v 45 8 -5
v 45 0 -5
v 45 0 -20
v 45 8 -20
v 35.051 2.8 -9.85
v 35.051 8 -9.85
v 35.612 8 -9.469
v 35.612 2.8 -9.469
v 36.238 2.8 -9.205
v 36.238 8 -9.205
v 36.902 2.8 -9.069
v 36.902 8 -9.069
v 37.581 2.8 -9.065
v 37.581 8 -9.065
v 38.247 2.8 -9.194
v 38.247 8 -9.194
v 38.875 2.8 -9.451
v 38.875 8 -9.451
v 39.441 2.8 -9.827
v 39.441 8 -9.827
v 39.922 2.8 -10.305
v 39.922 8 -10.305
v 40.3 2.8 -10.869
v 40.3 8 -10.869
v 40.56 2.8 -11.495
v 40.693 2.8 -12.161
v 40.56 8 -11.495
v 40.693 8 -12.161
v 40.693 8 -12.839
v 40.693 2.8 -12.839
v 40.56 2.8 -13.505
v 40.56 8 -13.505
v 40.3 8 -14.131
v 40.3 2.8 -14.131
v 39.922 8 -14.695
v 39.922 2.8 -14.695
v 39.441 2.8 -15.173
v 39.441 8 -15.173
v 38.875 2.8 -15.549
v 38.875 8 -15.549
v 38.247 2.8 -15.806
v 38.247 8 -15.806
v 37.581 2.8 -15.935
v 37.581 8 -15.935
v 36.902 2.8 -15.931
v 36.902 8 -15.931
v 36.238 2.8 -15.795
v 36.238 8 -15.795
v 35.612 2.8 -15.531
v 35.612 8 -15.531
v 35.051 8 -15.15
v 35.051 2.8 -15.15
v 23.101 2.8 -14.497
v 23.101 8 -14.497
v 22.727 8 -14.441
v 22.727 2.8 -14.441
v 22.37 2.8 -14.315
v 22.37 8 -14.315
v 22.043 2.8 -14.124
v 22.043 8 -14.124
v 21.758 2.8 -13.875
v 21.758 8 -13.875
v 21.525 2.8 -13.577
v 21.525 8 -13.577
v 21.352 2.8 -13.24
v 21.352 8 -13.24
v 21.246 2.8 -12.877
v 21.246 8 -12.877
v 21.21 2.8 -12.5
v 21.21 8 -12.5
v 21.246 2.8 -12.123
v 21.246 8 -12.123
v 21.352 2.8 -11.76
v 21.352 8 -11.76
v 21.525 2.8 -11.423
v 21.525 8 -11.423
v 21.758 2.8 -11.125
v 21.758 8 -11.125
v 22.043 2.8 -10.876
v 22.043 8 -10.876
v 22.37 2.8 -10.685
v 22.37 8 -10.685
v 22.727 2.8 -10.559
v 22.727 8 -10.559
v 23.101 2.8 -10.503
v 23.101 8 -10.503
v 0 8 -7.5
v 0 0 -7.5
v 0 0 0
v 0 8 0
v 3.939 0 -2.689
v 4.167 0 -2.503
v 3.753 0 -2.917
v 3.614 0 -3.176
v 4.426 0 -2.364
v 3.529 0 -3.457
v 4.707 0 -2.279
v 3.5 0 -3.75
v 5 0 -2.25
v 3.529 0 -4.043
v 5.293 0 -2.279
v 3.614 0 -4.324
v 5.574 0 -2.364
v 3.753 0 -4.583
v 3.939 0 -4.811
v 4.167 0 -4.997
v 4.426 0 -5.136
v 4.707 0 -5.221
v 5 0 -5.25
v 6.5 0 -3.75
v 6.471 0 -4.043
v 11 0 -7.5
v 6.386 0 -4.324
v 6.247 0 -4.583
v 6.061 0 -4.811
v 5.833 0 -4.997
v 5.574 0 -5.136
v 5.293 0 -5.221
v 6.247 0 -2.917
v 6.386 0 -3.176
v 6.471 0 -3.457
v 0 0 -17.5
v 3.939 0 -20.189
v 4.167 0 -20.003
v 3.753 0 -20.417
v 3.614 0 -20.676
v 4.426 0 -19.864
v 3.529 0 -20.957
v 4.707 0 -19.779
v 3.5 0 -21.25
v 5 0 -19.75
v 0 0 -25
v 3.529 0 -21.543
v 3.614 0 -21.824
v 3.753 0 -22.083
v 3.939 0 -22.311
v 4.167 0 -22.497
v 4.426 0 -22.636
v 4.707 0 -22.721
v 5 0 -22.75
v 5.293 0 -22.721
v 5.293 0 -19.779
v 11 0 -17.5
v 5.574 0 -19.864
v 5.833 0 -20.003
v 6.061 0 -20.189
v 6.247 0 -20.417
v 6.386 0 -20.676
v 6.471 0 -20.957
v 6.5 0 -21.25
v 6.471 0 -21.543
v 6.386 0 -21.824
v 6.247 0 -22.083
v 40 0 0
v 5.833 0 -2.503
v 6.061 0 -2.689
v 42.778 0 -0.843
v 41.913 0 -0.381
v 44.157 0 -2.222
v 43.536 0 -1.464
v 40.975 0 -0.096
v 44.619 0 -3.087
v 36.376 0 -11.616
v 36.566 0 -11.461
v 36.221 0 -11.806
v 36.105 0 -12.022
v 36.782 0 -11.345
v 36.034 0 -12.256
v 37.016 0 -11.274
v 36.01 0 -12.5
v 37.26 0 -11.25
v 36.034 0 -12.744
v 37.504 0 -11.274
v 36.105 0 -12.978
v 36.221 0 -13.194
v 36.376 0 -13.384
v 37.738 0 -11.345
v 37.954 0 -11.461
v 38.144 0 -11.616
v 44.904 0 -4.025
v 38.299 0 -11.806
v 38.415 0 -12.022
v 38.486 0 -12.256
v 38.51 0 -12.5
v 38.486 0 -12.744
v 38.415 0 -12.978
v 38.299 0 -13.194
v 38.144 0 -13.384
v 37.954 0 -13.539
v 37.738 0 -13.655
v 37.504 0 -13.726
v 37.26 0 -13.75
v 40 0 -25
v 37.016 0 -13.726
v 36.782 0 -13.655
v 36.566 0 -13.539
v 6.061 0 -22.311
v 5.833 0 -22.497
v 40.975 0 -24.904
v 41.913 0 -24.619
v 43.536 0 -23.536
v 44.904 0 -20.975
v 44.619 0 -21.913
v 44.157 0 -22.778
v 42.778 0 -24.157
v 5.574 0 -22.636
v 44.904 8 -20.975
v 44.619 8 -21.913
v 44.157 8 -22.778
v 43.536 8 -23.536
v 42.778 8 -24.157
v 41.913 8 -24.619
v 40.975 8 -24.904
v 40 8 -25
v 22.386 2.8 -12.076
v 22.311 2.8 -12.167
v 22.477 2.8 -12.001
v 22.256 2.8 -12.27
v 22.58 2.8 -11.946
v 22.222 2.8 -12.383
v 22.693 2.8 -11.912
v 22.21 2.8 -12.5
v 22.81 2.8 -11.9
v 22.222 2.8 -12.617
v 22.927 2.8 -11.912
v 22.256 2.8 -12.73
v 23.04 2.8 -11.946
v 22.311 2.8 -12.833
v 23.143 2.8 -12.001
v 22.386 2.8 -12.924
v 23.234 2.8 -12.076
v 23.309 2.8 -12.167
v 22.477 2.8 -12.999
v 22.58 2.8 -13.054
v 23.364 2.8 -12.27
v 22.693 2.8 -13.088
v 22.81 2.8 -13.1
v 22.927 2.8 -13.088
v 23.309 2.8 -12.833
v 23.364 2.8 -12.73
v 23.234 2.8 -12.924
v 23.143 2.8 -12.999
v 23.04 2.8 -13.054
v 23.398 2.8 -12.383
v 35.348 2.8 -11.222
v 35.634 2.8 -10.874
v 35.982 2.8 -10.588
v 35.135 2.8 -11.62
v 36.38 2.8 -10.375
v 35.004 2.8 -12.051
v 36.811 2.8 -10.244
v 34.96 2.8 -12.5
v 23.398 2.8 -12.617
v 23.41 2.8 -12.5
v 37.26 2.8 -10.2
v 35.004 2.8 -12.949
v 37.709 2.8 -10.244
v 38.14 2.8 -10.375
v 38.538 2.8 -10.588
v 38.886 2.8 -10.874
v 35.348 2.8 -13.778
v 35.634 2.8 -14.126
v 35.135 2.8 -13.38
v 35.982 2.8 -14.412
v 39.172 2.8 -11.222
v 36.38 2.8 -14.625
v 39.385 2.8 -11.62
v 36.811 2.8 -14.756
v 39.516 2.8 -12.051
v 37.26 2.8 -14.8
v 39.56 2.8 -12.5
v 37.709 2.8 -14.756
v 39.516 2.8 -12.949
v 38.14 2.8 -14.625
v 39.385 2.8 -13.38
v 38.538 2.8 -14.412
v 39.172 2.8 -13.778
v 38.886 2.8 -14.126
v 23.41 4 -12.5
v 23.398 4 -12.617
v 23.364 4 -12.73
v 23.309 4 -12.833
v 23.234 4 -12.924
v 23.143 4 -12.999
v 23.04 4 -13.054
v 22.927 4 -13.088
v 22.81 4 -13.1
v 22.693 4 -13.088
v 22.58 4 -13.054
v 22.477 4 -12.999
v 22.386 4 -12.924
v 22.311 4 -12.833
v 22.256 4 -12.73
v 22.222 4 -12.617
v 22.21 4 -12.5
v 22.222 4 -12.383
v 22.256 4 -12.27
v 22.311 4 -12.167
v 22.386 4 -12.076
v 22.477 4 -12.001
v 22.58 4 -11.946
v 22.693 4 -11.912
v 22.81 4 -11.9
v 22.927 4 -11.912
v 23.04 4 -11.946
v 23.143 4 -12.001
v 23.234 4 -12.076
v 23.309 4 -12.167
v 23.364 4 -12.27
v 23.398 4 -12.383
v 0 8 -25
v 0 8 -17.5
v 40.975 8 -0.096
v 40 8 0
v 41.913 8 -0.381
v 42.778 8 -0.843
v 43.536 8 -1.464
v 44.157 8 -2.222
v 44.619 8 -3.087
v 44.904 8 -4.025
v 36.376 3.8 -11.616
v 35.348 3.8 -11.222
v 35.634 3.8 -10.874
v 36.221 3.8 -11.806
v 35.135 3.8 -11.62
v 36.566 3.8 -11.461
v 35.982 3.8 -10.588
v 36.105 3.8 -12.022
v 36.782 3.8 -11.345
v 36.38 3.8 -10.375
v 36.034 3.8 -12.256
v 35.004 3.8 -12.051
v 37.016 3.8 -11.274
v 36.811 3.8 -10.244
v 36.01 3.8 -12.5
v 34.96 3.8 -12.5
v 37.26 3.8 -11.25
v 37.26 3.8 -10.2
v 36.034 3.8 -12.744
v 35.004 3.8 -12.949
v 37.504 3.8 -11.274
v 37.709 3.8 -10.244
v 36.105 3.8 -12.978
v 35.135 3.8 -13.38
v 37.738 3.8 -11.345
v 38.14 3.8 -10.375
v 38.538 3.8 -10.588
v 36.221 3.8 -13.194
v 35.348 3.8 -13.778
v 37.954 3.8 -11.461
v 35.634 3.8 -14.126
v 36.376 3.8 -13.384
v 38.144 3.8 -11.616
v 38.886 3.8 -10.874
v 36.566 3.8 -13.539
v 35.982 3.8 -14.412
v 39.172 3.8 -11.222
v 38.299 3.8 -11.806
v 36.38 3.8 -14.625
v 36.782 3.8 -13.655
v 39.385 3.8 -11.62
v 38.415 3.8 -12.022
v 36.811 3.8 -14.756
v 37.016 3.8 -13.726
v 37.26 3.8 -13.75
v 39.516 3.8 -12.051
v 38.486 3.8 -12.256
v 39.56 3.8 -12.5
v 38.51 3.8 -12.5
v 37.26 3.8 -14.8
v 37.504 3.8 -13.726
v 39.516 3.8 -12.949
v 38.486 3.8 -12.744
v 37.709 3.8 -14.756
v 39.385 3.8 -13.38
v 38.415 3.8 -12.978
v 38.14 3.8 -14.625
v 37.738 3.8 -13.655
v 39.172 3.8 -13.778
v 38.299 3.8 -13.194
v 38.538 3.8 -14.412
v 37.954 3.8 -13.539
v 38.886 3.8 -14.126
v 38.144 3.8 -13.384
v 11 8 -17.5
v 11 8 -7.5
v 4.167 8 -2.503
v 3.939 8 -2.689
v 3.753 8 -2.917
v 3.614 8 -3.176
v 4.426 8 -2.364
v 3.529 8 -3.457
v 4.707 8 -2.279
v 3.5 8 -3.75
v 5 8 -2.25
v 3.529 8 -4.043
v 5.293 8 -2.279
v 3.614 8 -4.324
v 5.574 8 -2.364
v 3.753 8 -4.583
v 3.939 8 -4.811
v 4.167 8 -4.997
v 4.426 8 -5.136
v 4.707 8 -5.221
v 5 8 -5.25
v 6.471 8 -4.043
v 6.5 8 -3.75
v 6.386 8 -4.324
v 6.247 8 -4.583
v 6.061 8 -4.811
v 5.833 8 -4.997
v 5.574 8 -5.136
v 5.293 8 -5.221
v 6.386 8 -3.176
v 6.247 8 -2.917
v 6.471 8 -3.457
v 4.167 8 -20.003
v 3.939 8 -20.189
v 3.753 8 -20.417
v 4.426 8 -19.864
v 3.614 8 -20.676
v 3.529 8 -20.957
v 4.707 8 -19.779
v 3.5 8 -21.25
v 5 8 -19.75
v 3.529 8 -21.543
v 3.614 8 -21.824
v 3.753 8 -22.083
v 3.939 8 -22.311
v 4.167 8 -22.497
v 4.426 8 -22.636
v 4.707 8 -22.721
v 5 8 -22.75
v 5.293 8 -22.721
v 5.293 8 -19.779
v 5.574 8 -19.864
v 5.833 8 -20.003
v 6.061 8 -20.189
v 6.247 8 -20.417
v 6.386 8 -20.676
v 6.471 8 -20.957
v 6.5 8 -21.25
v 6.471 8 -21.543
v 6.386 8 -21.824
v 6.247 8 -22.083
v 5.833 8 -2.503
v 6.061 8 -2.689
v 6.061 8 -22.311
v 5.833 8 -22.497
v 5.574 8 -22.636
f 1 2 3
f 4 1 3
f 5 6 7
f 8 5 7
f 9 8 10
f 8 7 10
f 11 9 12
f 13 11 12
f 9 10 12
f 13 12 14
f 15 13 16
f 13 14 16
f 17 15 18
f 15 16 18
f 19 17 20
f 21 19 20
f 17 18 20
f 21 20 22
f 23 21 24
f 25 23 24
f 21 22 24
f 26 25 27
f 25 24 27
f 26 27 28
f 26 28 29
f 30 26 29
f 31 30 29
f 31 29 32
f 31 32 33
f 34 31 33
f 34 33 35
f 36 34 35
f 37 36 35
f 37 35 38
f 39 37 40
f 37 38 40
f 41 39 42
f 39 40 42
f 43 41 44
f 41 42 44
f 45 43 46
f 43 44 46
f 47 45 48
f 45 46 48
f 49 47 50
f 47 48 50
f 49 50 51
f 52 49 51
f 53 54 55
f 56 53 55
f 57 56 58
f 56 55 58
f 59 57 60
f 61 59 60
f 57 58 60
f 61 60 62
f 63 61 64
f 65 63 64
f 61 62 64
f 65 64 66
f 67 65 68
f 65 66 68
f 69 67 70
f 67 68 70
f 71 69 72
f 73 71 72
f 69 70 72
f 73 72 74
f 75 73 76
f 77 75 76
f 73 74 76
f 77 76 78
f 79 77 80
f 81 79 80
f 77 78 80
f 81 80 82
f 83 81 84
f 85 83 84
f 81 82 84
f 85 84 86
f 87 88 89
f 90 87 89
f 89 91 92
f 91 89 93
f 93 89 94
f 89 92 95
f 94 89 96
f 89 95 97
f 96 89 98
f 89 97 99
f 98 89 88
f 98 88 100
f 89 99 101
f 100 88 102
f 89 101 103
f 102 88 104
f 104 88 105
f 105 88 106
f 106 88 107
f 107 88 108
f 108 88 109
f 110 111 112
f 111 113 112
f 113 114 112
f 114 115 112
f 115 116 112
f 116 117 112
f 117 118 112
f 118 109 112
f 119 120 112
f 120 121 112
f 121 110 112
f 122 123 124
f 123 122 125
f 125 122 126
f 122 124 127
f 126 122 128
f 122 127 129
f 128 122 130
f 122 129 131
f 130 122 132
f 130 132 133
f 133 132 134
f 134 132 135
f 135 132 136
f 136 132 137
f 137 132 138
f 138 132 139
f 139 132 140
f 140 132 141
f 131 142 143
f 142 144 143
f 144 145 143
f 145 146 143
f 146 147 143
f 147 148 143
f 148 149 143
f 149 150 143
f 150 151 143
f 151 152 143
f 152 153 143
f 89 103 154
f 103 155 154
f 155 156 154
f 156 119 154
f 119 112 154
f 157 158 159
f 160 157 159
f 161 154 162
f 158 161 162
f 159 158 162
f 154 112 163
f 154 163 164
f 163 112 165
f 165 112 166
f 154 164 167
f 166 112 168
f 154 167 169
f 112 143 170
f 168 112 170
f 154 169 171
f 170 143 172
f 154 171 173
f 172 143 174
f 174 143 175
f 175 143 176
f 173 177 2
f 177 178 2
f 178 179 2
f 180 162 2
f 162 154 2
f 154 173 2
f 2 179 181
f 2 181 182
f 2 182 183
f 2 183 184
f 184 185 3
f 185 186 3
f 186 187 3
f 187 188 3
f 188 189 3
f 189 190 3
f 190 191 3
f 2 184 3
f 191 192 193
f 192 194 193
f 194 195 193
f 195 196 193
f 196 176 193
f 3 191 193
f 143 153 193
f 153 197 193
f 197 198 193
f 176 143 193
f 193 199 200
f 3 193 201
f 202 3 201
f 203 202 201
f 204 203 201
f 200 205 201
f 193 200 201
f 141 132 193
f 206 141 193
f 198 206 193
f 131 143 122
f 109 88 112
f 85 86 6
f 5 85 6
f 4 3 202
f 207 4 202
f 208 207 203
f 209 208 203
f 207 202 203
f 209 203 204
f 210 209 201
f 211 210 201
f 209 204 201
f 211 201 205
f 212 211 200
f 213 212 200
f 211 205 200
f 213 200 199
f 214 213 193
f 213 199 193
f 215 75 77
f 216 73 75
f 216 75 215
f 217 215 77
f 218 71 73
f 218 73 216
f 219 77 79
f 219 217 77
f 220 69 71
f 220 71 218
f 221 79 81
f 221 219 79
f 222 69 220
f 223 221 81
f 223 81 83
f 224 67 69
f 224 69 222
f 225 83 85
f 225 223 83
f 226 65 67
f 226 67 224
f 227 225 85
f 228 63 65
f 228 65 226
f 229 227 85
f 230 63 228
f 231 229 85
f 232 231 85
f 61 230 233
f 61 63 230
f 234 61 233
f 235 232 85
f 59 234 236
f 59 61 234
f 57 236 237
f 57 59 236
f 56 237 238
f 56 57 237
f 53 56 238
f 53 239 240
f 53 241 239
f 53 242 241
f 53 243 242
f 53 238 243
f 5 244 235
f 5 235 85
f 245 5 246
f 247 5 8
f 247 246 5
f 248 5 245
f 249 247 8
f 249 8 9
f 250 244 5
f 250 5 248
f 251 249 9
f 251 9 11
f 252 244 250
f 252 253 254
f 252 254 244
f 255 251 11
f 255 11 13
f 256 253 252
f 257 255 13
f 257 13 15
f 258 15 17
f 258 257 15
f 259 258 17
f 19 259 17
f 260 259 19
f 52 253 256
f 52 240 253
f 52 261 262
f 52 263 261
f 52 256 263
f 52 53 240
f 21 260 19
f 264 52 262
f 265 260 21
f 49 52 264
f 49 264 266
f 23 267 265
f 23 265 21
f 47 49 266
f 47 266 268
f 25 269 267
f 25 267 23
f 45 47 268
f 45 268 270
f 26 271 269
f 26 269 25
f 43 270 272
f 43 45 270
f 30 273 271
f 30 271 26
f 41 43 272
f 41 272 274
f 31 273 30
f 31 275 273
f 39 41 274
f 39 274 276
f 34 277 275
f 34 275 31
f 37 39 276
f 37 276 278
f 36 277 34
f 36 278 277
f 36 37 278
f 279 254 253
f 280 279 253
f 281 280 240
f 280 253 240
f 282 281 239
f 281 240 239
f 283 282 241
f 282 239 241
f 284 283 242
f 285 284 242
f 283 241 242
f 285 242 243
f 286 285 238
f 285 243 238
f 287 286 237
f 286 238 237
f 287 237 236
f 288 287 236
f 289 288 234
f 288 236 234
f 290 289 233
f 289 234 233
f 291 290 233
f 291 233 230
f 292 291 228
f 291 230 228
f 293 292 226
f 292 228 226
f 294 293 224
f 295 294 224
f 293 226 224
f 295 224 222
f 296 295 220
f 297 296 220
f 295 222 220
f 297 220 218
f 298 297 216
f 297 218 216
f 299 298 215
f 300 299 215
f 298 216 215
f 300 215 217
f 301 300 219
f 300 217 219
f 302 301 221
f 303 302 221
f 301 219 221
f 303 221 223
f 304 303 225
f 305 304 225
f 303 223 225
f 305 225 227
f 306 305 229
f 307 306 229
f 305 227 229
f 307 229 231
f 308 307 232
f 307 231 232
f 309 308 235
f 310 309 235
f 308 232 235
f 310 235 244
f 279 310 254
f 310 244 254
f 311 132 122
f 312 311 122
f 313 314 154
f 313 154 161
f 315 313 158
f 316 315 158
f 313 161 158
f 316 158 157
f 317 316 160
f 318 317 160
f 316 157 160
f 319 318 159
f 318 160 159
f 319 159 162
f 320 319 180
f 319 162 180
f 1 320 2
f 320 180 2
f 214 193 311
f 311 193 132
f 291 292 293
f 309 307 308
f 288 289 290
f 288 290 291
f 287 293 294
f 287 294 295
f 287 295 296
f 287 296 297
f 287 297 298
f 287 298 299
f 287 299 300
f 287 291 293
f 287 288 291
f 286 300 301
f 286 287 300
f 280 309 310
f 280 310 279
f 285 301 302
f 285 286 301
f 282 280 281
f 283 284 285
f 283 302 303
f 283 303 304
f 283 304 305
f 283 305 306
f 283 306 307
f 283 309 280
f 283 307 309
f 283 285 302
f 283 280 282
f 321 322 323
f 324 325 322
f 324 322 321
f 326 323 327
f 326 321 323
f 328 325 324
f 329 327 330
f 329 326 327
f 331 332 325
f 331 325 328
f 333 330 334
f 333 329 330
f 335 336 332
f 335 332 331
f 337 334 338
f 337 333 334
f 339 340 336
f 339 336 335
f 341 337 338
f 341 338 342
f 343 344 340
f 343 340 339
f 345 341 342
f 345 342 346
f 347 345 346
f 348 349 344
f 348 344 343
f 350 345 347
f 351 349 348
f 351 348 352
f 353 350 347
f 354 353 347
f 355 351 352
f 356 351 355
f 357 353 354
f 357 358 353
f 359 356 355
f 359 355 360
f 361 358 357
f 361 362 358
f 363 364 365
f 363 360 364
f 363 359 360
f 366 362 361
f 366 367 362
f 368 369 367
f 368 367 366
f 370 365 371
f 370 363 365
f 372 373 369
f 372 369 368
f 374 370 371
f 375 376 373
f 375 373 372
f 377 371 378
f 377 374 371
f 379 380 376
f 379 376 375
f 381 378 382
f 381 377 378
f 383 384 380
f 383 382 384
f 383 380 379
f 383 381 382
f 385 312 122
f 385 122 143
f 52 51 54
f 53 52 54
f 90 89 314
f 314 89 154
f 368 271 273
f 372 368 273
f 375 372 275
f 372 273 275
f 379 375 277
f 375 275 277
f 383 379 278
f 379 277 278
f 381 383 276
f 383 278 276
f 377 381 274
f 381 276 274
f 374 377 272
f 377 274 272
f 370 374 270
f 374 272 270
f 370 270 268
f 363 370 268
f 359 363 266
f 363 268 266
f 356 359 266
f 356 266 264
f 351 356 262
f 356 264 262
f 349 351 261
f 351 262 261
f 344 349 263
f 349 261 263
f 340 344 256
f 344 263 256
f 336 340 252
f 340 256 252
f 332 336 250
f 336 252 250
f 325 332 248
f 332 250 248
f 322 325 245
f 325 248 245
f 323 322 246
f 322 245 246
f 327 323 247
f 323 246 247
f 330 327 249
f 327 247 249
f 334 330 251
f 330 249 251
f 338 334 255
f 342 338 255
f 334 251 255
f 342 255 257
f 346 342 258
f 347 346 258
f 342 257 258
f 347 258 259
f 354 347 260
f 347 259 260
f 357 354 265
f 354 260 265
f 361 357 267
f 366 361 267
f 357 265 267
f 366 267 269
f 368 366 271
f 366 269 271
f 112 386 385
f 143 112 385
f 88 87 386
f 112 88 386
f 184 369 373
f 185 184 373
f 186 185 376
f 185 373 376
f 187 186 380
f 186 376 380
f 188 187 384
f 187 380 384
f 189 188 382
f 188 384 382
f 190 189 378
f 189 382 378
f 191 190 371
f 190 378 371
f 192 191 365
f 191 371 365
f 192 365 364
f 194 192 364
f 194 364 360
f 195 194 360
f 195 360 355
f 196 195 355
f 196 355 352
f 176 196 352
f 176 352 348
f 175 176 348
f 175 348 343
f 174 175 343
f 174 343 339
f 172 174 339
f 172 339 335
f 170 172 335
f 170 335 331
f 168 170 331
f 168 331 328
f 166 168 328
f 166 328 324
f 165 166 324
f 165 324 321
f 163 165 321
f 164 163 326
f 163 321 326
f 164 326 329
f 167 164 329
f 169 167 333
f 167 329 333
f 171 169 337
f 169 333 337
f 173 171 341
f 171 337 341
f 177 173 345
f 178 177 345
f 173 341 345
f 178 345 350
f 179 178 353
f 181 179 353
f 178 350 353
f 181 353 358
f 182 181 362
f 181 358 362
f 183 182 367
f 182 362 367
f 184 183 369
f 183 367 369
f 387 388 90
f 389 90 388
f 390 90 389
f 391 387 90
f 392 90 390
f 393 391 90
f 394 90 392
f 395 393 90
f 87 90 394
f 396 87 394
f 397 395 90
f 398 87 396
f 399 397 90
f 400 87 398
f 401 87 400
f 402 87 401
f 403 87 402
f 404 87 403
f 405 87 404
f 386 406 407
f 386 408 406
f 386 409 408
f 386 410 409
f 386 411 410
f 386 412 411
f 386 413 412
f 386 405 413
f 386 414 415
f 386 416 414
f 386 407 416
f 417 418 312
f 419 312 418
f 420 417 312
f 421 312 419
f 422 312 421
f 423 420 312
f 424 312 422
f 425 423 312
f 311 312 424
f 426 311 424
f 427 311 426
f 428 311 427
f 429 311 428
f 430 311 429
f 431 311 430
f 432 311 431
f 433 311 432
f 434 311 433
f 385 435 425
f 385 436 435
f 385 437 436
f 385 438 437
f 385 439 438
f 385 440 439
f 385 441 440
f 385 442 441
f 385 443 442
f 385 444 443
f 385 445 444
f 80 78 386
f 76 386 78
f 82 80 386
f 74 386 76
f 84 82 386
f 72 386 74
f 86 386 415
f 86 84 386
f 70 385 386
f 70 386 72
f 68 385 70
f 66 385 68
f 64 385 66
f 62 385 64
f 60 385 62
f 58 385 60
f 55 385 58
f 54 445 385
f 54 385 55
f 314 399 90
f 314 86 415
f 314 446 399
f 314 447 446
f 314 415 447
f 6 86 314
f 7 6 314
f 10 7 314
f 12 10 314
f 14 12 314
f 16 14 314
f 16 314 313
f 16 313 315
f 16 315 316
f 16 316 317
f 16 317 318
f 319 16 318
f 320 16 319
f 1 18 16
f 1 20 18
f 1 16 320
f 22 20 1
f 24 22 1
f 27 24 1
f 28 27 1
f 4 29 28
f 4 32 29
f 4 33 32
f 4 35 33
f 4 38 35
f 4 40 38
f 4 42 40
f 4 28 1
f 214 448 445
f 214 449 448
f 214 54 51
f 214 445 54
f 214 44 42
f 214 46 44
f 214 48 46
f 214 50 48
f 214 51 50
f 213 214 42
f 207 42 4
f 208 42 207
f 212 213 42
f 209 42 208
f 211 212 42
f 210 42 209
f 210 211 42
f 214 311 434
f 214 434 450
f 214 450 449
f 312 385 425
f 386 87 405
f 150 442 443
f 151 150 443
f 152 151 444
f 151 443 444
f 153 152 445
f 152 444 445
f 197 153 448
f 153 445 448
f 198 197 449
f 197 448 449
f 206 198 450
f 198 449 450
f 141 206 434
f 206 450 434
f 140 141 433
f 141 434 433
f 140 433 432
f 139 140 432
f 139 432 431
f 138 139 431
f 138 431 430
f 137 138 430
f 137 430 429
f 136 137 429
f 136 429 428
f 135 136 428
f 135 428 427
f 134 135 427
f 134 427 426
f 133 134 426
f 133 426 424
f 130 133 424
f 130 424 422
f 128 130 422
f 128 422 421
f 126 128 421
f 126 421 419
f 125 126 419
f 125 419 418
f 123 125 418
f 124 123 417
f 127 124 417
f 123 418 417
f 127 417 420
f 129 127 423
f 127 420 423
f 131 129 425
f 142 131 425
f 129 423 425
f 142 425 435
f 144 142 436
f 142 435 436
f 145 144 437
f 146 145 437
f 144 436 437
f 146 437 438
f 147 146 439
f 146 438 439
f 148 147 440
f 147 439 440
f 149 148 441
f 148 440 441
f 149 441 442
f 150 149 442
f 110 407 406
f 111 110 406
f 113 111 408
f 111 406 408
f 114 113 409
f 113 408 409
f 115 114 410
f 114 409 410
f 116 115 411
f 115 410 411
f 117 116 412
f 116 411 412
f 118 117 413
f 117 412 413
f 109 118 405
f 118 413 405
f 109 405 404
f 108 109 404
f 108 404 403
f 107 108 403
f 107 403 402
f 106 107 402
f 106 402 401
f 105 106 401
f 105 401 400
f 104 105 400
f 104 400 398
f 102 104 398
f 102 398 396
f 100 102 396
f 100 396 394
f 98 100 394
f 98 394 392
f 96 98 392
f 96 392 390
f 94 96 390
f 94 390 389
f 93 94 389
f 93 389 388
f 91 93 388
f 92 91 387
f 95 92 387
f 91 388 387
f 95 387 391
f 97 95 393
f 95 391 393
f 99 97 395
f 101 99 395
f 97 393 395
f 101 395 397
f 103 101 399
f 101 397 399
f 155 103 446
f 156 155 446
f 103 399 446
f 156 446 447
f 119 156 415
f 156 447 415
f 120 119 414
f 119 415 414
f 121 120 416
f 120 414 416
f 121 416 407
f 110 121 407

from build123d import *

# Parameters (mm, degrees)
BOSS_EXTRUDE1_DEPTH = 8
CUT_EXTRUDE1_DEPTH  = 5.2
SKETCH3_R           = 2.3
BOSS_EXTRUDE2_DEPTH = 1
SKETCH4_R           = 1.25
CUT_EXTRUDE2_DEPTH  = 4.8
SKETCH5_R           = 1.5
SKETCH5_W           = 11
SKETCH5_H           = 10
CUT_EXTRUDE3_DEPTH  = 9
SKETCH7_R           = 0.6
BOSS_EXTRUDE3_DEPTH = 1.2


with BuildPart() as part:
    # Sketch1 → Boss-Extrude1 (new body)
    with BuildSketch(Plane(origin=(0, 0, 0), x_dir=(1, 0, 0), z_dir=(0, 1, 0))):
        with BuildLine():
            Line((5, 0), (40, 0))
            ThreePointArc((40, 0), (43.535533906, 1.464466094), (45, 5))
            Line((45, 5), (45, 20))
            ThreePointArc((45, 20), (43.535533906, 23.535533906), (40, 25))
            Line((40, 25), (5, 25))
            Line((5, 25), (0, 25))
            Line((0, 25), (0, 20))
            Line((0, 20), (0, 5))
            Line((0, 5), (0, 0))
            Line((0, 0), (5, 0))
        make_face()
    extrude(amount=BOSS_EXTRUDE1_DEPTH)

    # Sketch2 → Cut-Extrude1 (cut)
    with BuildSketch(Plane(origin=(0, 8, 0), x_dir=(1, 0, 0), z_dir=(0, 1, 0))):
        with BuildLine():
            Line((35.050927797, 15.15), (23.100878033, 14.49702088))
            ThreePointArc((23.100878033, 14.49702088), (21.21, 12.5), (23.100878033, 10.50297912))
            Line((23.100878033, 10.50297912), (35.050927797, 9.85))
            ThreePointArc((35.050927797, 9.85), (40.71, 12.5), (35.050927797, 15.15))
        make_face()
    extrude(amount=-CUT_EXTRUDE1_DEPTH, mode=Mode.SUBTRACT)

    # Sketch3 → Boss-Extrude2 (add)
    with BuildSketch(Plane(origin=(0, 2.8, 0), x_dir=(1, 0, 0), z_dir=(0, 1, 0))):
        with Locations((37.26, 12.5)):
            Circle(SKETCH3_R)
    extrude(amount=BOSS_EXTRUDE2_DEPTH)

    # Sketch4 → Cut-Extrude2 (cut, through all)
    with BuildSketch(Plane(origin=(0, 3.8, 0), x_dir=(1, 0, 0), z_dir=(0, 1, 0))):
        with Locations((37.26, 12.5)):
            Circle(SKETCH4_R)
    extrude(amount=-CUT_EXTRUDE2_DEPTH, mode=Mode.SUBTRACT)

    # Sketch5 → Cut-Extrude3 (cut, through all)
    with BuildSketch(Plane(origin=(0, 8, 0), x_dir=(1, 0, 0), z_dir=(0, 1, 0))):
        with Locations((5, 21.25)):
            Circle(SKETCH5_R)
        with Locations((5, 3.75)):
            Circle(SKETCH5_R)
        with Locations((5.5, 12.5)):
            Rectangle(SKETCH5_W, SKETCH5_H)
    extrude(amount=-CUT_EXTRUDE3_DEPTH, mode=Mode.SUBTRACT)

    # Sketch7 → Boss-Extrude3 (add)
    with BuildSketch(Plane(origin=(0, 2.8, 0), x_dir=(1, 0, 0), z_dir=(0, 1, 0))):
        with Locations((22.81, 12.5)):
            Circle(SKETCH7_R)
    extrude(amount=BOSS_EXTRUDE3_DEPTH)


solid = part.part
